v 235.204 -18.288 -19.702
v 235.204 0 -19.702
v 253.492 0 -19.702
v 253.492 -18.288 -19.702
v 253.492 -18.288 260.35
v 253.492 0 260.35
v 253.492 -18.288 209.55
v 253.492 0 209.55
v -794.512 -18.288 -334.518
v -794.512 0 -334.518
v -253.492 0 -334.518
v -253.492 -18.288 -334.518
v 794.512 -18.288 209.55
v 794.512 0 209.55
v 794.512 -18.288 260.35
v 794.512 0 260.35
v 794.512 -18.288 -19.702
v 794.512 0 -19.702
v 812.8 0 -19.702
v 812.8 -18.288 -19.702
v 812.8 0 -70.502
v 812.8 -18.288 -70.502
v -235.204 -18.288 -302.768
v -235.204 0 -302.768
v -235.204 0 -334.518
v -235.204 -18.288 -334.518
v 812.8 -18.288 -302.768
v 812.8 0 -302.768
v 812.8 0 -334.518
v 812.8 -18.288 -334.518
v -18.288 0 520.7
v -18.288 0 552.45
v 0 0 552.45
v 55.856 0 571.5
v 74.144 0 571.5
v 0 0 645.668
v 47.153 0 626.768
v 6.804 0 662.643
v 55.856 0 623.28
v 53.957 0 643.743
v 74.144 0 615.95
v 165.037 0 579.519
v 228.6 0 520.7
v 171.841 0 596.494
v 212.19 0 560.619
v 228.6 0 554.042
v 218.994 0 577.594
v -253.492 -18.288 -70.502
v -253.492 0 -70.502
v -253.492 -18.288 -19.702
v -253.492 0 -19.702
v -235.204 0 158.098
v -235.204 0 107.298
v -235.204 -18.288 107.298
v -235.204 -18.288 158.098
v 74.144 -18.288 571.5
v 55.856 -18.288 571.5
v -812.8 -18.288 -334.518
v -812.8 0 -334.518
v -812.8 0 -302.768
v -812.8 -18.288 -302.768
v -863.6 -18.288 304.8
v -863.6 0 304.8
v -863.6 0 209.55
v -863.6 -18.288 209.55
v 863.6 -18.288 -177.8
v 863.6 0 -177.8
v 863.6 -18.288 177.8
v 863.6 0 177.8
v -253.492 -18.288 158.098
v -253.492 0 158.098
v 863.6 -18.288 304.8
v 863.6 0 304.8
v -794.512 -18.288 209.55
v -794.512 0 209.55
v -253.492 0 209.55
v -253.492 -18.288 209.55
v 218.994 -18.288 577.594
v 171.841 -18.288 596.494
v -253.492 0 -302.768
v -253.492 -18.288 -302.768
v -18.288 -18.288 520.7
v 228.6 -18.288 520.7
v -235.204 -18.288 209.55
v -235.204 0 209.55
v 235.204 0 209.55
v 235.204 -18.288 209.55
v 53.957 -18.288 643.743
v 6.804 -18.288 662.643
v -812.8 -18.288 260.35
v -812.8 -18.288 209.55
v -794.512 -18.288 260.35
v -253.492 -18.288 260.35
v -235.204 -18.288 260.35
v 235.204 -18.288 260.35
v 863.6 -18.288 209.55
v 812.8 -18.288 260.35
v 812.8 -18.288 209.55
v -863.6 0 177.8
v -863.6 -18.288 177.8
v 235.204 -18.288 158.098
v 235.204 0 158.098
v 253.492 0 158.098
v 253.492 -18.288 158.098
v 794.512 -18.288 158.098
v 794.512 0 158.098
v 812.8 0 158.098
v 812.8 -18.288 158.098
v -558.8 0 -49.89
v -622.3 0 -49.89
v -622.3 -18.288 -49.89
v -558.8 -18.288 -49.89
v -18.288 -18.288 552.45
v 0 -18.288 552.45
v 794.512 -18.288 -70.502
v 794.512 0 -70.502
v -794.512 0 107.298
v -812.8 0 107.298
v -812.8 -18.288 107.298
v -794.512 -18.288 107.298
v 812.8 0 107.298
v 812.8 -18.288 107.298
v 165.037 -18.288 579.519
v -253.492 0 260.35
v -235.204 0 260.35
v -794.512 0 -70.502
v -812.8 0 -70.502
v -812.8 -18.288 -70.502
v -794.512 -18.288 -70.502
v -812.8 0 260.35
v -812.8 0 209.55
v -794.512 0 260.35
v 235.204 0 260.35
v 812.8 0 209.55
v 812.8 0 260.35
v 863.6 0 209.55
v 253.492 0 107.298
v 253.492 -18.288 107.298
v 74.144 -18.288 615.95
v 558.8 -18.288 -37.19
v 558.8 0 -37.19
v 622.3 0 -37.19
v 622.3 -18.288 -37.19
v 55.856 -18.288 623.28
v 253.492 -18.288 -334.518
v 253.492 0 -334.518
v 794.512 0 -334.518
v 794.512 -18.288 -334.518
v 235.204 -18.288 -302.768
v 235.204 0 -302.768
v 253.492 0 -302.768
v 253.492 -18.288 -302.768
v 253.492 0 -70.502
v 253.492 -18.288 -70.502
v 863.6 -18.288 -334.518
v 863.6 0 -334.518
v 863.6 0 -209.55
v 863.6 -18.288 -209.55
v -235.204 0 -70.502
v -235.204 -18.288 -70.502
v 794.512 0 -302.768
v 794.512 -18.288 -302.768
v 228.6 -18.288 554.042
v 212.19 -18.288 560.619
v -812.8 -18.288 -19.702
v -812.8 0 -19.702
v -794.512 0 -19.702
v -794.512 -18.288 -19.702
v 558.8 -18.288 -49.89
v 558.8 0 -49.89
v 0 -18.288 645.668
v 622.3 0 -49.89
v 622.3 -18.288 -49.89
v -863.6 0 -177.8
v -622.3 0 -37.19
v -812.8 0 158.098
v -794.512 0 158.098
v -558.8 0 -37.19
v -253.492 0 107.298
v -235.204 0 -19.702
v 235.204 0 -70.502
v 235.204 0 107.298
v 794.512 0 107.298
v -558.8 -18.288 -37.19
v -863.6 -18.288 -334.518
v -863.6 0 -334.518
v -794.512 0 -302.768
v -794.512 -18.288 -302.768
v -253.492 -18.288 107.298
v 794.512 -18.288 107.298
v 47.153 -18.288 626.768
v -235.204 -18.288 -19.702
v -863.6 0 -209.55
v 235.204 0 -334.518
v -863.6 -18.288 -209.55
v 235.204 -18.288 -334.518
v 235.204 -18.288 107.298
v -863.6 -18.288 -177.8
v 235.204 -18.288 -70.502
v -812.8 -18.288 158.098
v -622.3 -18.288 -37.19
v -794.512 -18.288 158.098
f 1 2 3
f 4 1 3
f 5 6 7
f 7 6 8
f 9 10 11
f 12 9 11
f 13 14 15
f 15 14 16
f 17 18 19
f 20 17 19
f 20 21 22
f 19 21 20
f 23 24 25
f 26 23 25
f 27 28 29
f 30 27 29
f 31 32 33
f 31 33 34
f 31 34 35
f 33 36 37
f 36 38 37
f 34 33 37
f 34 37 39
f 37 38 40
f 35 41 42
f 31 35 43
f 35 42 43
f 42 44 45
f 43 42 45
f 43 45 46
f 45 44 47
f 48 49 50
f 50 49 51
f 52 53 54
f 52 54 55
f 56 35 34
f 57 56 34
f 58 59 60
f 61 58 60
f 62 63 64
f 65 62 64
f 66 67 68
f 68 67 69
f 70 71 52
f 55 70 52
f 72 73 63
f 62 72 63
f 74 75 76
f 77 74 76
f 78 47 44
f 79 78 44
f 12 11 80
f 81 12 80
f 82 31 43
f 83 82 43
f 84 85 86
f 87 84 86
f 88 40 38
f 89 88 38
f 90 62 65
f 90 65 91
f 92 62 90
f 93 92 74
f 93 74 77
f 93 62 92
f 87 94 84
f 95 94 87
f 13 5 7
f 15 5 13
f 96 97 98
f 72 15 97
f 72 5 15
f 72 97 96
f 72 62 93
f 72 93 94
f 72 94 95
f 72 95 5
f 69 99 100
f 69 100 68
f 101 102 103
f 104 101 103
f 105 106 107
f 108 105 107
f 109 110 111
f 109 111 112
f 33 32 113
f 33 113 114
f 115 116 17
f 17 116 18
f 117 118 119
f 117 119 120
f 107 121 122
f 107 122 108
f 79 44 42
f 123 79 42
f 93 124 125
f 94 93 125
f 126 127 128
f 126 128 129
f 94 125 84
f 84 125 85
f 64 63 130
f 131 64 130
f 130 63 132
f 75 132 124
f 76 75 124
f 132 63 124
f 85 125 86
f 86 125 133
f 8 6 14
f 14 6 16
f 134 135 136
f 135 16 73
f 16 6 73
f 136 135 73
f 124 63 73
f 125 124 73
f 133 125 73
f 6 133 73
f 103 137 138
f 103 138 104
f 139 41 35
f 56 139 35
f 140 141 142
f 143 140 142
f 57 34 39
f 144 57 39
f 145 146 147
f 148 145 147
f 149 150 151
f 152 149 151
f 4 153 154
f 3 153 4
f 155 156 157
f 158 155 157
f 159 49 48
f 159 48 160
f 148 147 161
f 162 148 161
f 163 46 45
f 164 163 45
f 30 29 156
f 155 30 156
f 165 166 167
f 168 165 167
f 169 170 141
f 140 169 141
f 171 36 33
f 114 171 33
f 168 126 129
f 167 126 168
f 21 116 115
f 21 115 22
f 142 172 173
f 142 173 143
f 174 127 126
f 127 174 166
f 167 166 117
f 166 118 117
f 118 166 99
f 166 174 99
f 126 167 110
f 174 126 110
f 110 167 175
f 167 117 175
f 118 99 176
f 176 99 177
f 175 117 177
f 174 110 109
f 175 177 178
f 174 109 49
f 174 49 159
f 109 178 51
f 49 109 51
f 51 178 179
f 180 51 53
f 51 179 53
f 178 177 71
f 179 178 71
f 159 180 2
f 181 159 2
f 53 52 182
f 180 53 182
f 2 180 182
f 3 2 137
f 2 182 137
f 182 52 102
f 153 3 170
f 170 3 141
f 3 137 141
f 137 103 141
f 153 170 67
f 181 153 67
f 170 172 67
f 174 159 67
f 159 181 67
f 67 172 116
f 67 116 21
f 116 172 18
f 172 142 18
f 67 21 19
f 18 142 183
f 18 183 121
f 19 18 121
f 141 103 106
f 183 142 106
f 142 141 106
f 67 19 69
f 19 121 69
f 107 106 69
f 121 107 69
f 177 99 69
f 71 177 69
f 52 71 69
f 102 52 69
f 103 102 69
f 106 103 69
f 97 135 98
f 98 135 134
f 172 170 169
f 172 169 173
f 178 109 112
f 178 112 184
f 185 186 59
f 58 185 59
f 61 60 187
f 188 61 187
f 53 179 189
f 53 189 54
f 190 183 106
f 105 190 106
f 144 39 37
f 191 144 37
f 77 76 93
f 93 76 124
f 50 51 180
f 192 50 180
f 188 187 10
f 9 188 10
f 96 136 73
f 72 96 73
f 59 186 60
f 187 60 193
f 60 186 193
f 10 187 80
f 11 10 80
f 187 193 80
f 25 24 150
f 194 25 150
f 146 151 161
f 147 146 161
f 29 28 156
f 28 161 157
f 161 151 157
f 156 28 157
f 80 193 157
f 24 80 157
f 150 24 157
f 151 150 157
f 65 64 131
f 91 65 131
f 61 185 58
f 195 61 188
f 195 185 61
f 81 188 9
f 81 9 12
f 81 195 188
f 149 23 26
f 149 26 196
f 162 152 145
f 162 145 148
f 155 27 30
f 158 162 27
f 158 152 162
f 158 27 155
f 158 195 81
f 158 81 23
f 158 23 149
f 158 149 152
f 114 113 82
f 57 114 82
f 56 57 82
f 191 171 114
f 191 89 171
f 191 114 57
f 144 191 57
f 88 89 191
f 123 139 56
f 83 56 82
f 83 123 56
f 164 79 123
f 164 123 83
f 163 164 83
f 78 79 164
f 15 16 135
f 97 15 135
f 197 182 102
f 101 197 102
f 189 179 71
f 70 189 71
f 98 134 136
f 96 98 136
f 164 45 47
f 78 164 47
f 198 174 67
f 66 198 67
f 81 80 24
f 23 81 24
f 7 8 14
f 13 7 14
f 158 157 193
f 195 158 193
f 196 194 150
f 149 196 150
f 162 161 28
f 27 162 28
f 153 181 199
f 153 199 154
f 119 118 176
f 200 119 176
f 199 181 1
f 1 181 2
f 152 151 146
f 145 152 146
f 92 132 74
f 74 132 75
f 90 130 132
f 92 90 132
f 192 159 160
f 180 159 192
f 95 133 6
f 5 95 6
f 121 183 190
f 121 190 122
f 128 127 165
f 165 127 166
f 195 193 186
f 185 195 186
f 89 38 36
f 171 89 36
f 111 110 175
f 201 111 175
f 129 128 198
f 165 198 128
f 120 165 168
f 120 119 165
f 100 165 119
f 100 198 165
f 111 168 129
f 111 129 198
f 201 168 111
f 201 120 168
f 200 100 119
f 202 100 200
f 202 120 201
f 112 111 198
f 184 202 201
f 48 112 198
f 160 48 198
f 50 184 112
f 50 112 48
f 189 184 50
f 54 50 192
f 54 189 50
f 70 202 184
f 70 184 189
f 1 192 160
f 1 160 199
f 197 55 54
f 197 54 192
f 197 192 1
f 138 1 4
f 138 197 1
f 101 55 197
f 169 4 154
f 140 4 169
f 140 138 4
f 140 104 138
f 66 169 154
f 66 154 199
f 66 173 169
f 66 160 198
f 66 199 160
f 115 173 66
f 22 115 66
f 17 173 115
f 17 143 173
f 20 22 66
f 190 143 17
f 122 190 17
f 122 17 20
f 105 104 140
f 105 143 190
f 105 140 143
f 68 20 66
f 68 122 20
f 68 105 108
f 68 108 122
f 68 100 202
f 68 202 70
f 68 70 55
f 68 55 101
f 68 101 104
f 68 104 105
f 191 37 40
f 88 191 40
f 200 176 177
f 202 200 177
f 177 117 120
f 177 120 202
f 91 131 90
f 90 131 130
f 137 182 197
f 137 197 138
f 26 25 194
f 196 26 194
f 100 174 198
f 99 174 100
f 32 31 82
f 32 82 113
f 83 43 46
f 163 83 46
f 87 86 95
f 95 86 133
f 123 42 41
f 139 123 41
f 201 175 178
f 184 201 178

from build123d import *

# Parameters (mm, degrees)
F0_W     = 18.288
F0_H     = 31.75
F1_DEPTH = 18.288
F0_W_2   = 1727.2
F0_H_2   = 355.6
F0_H_3   = 50.8
F0_W_3   = 63.5
F0_H_4   = 12.7


with BuildPart() as f1:
    # F0 (on Front) → F1 (new body)
    with BuildSketch(Plane.XZ):
        Polygon((47.15337043, 626.7682736239), (0, 645.668), (0, 552.45), (0, 520.7), (228.6, 520.7), (228.6, 554.041942092), (212.190166935, 560.6192313076), (181.2694409242, 573.0126881406), (165.036796505, 579.5189576837), (74.1441349231, 615.95), (74.1441349231, 571.5), (55.8561349231, 571.5), (55.8561349231, 615.95), (55.8561349231, 623.2800846326), align=None)
        Polygon((6.8039014954, 662.6432133548), (0, 645.668), (47.15337043, 626.7682736239), (53.9572719254, 643.7434869787), align=None)
        Polygon((181.2694409242, 573.0126881406), (212.190166935, 560.6192313076), (218.9940684304, 577.5944446624), (188.0733424196, 589.9879014954), align=None)
        Polygon((171.8406980004, 596.4941710385), (165.036796505, 579.5189576837), (181.2694409242, 573.0126881406), (188.0733424196, 589.9879014954), align=None)
        with Locations((-9.144, 536.575)):
            Rectangle(F0_W, F0_H)
    extrude(amount=F1_DEPTH)


with BuildPart() as f1b:
    # F0 (on Front) → F1, piece 2 (new body)
    with BuildSketch(Plane.XZ):
        Polygon((-863.6, 304.8), (-863.6, 209.55), (-812.8, 209.55), (-812.8, 260.35), (-794.512, 260.35), (-794.512, 209.55), (-253.492, 209.55), (-253.492, 260.35), (-235.204, 260.35), (-235.204, 209.55), (235.204, 209.55), (235.204, 260.35), (253.492, 260.35), (253.492, 209.55), (794.512, 209.55), (794.512, 260.35), (812.8, 260.35), (812.8, 209.55), (863.6, 209.55), (863.6, 304.8), align=None)
    extrude(amount=F1_DEPTH)


with BuildPart() as f1c:
    # F0 (on Front) → F1, piece 3 (new body)
    with BuildSketch(Plane.XZ):
        Rectangle(F0_W_2, F0_H_2)
        with Locations((-803.656, -45.1023116593)):
            Rectangle(F0_W, F0_H_3, mode=Mode.SUBTRACT)
        with Locations((-590.55, -43.5403157824)):
            Rectangle(F0_W_3, F0_H_4, mode=Mode.SUBTRACT)
        with Locations((-803.656, 132.6976883407)):
            Rectangle(F0_W, F0_H_3, mode=Mode.SUBTRACT)
        with Locations((-244.348, -45.1023116593)):
            Rectangle(F0_W, F0_H_3, mode=Mode.SUBTRACT)
        with Locations((-244.348, 132.6976883407)):
            Rectangle(F0_W, F0_H_3, mode=Mode.SUBTRACT)
        with Locations((244.348, -45.1023116593)):
            Rectangle(F0_W, F0_H_3, mode=Mode.SUBTRACT)
        with Locations((244.348, 132.6976883407)):
            Rectangle(F0_W, F0_H_3, mode=Mode.SUBTRACT)
        with Locations((590.55, -43.5403157824)):
            Rectangle(F0_W_3, F0_H_4, mode=Mode.SUBTRACT)
        with Locations((803.656, -45.1023116593)):
            Rectangle(F0_W, F0_H_3, mode=Mode.SUBTRACT)
        with Locations((803.656, 132.6976883407)):
            Rectangle(F0_W, F0_H_3, mode=Mode.SUBTRACT)
    extrude(amount=F1_DEPTH)


with BuildPart() as f1d:
    # F0 (on Front) → F1, piece 4 (new body)
    with BuildSketch(Plane.XZ):
        Polygon((863.6, -209.55), (-863.6, -209.55), (-863.6, -334.518), (-812.8, -334.518), (-812.8, -302.768), (-794.512, -302.768), (-794.512, -334.518), (-253.492, -334.518), (-253.492, -302.768), (-235.204, -302.768), (-235.204, -334.518), (235.204, -334.518), (235.204, -302.768), (253.492, -302.768), (253.492, -334.518), (794.512, -334.518), (794.512, -302.768), (812.8, -302.768), (812.8, -334.518), (863.6, -334.518), align=None)
    extrude(amount=F1_DEPTH)


solid = Compound([f1.part, f1b.part, f1c.part, f1d.part])
